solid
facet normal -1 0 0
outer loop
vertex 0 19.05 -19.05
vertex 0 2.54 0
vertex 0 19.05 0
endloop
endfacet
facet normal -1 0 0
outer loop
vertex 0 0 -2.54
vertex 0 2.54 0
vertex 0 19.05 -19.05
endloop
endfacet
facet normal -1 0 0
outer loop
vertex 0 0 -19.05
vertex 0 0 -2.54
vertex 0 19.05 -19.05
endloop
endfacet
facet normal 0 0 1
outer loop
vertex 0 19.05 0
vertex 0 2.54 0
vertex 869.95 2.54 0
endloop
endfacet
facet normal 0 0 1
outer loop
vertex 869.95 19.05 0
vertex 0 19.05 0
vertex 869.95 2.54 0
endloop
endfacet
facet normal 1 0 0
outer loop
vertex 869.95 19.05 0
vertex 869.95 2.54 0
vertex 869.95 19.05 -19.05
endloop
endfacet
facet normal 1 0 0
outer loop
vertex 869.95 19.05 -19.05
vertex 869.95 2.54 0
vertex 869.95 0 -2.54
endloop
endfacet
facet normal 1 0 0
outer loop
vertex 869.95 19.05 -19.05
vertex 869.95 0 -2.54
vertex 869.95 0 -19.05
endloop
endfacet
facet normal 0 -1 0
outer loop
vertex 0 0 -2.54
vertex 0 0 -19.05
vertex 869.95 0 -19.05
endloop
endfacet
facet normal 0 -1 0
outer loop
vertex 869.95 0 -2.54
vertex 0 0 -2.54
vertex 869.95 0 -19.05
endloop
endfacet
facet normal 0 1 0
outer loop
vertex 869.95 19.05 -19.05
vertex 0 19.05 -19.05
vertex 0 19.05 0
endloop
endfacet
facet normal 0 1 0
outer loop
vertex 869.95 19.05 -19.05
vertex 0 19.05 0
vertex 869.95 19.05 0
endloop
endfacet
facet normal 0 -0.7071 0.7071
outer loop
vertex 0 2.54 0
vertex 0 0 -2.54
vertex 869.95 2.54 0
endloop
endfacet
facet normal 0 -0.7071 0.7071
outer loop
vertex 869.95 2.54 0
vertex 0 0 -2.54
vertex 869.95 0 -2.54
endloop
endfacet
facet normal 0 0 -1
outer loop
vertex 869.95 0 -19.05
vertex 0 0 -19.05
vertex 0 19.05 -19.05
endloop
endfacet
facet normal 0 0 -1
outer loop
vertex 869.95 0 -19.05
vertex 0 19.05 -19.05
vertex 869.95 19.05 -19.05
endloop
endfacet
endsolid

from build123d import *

# Parameters (mm, degrees)
SKETCH1_W           = 869.95
SKETCH1_H           = 19.05
BOSS_EXTRUDE1_DEPTH = 19.05
CHAMFER1_SIZE       = 2.54


with BuildPart() as part:
    # Sketch1 → Boss-Extrude1 (new body)
    with BuildSketch(Plane(origin=(0, 0, 0), x_dir=(1, 0, 0), z_dir=(0, 1, 0))):
        with Locations((434.975, 9.525)):
            Rectangle(SKETCH1_W, SKETCH1_H)
    extrude(amount=BOSS_EXTRUDE1_DEPTH)

    # Chamfer1
    chamfer1_edges = [part.edges().sort_by_distance(p)[0] for p in [
        (434.975, 0, 0),
    ]]
    chamfer(chamfer1_edges, length=CHAMFER1_SIZE)


solid = part.part
